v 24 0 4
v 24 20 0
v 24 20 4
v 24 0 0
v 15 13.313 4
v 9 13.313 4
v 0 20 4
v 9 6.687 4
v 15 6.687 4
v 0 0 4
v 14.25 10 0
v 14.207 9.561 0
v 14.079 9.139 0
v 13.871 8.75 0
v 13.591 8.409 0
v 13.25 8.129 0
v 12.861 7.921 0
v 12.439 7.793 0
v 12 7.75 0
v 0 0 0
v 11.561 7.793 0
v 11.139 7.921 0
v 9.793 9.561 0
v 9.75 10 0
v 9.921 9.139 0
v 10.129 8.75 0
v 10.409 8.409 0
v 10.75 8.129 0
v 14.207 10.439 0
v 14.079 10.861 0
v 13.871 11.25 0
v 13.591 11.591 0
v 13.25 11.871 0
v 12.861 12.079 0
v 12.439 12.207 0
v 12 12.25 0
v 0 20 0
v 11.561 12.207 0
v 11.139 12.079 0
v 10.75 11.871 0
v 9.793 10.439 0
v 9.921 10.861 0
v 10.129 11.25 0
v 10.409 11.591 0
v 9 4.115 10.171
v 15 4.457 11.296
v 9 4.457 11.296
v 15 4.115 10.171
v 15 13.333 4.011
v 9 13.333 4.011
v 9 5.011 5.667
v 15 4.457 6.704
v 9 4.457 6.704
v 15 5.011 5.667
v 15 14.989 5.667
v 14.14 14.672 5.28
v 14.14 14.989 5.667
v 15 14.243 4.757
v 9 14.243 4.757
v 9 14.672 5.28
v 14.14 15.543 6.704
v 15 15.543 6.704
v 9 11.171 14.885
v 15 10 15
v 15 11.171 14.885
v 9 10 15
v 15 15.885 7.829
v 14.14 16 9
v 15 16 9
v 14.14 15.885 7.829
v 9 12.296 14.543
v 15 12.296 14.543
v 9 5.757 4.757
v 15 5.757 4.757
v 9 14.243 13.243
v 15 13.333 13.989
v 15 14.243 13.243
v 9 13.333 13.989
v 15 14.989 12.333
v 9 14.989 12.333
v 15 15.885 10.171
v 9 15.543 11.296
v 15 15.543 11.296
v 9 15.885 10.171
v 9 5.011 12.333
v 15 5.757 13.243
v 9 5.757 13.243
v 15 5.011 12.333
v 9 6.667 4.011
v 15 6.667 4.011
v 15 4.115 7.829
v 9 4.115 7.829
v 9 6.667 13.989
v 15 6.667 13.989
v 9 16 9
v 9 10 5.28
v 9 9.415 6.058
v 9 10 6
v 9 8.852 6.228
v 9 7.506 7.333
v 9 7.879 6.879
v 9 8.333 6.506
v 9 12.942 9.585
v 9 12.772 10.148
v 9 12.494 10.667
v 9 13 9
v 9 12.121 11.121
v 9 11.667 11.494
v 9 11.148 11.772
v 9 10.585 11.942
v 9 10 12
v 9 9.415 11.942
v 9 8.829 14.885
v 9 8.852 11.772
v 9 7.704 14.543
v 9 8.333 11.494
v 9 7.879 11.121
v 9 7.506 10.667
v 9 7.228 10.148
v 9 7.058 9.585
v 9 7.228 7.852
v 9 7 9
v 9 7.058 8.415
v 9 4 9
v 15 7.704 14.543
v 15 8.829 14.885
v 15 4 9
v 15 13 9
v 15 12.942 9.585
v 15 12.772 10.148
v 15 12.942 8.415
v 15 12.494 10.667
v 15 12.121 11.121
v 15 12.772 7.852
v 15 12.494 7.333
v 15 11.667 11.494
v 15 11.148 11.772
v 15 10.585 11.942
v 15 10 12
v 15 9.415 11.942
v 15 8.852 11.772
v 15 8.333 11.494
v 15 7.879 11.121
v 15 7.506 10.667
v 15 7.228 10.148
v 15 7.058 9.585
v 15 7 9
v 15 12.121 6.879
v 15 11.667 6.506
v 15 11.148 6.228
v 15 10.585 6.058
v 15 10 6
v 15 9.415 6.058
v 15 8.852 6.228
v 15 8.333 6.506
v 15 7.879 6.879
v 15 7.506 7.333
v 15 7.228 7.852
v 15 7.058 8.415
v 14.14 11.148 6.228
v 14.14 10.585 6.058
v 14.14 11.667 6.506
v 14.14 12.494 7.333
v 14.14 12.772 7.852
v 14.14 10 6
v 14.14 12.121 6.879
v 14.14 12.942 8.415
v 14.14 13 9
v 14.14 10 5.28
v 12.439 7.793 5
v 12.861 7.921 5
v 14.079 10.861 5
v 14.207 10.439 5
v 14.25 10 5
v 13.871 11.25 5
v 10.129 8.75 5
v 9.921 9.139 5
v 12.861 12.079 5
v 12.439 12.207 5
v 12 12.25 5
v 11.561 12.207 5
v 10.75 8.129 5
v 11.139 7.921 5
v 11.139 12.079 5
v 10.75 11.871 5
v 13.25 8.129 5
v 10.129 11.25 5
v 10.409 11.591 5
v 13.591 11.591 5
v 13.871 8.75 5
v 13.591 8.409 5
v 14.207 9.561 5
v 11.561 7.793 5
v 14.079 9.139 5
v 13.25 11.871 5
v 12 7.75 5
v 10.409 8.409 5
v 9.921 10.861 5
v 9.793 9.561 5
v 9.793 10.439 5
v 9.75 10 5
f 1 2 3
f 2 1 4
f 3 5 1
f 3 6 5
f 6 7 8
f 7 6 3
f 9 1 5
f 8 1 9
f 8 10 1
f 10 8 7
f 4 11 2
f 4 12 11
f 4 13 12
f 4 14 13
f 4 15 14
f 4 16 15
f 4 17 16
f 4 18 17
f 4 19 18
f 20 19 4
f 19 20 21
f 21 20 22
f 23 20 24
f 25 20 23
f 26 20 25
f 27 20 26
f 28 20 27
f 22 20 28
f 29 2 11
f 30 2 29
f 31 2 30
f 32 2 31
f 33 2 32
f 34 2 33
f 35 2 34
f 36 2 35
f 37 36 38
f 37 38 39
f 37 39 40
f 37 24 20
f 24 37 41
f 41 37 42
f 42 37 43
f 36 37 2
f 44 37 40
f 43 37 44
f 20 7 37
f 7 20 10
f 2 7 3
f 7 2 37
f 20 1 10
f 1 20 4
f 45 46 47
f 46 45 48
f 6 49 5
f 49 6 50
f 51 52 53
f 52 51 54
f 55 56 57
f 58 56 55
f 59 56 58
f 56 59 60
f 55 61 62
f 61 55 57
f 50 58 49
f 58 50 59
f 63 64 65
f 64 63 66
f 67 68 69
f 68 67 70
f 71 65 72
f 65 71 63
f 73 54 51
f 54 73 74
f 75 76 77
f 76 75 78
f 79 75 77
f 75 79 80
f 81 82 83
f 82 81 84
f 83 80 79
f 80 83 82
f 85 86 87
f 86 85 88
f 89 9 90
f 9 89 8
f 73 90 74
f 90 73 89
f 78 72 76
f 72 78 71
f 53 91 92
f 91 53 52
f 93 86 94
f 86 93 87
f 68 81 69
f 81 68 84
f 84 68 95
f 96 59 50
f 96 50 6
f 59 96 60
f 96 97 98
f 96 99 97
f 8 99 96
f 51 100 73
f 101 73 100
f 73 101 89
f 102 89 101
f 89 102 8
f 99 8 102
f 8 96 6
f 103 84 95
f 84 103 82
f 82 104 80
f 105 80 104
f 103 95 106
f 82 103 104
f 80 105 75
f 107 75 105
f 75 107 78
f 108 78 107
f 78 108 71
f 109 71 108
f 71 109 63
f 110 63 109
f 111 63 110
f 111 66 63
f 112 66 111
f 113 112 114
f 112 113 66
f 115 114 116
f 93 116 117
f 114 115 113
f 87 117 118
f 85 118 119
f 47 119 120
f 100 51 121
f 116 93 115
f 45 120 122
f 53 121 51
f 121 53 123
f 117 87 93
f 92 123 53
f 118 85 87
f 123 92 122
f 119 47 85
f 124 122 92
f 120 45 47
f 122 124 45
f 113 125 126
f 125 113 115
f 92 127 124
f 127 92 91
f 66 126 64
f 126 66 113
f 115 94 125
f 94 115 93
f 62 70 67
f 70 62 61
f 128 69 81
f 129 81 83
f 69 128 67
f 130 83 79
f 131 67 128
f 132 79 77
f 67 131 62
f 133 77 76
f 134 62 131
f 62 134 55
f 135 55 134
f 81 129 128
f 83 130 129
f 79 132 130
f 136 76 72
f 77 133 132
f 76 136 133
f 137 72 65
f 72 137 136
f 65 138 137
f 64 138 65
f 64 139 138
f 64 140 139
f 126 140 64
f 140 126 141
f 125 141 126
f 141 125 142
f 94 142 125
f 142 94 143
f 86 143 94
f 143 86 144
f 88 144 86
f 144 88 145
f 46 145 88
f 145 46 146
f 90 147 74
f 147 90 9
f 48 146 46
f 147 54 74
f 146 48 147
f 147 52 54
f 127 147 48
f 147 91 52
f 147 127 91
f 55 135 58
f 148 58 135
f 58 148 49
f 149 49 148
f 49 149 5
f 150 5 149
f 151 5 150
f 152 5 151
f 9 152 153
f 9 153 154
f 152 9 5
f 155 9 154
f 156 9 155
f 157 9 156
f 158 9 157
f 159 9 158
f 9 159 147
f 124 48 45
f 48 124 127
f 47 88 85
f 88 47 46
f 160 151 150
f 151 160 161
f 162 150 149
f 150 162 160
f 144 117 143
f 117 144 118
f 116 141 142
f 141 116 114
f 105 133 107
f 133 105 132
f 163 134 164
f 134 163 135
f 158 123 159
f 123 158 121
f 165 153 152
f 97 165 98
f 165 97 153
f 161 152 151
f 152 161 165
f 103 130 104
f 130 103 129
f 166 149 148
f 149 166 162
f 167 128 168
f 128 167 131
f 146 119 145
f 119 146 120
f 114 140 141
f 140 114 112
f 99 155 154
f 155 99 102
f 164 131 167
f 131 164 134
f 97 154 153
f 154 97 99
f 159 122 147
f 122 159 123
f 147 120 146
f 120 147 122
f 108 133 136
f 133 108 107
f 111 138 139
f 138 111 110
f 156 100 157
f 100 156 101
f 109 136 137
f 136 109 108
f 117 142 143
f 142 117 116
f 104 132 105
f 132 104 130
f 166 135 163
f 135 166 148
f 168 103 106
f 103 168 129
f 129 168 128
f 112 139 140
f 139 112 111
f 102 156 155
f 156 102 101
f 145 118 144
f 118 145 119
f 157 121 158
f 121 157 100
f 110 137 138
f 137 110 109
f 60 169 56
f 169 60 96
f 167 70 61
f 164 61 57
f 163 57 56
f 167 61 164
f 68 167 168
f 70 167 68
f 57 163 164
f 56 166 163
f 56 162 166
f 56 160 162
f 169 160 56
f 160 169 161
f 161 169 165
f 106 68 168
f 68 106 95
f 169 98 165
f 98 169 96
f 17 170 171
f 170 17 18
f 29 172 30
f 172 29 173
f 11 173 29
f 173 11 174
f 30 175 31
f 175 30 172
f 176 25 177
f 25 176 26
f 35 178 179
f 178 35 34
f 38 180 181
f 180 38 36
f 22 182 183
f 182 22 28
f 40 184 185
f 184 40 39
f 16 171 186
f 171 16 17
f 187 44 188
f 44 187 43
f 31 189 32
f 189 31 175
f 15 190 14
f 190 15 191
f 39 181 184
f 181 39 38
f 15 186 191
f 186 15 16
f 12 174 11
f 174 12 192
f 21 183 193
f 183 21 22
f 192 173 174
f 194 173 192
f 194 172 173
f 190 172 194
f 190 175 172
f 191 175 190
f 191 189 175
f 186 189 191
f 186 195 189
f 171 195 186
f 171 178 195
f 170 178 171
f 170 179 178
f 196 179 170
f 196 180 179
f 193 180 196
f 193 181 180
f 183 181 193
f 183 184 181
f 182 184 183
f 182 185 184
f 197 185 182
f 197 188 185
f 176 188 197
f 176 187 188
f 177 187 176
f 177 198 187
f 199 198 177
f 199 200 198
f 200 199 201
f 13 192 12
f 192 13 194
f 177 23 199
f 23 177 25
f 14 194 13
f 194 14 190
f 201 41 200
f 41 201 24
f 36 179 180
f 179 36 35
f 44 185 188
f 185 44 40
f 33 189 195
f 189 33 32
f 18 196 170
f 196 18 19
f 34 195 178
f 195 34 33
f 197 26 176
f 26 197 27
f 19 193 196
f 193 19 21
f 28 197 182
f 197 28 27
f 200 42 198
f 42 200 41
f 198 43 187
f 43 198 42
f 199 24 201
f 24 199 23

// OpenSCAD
$fn = 32;

// ----------------------------------------------------------------------
// Cable clip: cable 6 mm, clamp 12 mm, base 24 mm
// ----------------------------------------------------------------------

// --- parameters (mm) ---
base_w = 24;              // base length, X
base_d = 20;              // base width, Y
base_t = 4;               // base thickness
clamp_d = 12;             // clamp outside diameter
wall_t = 3;               // clamp wall
cable_d = 6;              // cable opening
ring_w = 6;               // clamp width along the cable
screw_d = 4.5;            // screw clearance
throat = 3.72;            // snap throat width
sink = 1;                 // overlap of the clamp into the base

module base() {
  cube([base_w, base_d, base_t]);
}

module clamp() {
  translate([base_w / 2, base_d / 2, base_t + clamp_d / 2 - sink]) rotate([0, 90, 0])
    cylinder(h = ring_w, d = clamp_d, center = true);
}

difference() {
  union() {
    base();
    clamp();
  }
  translate([base_w / 2, base_d / 2, base_t + clamp_d / 2 - sink]) rotate([0, 90, 0]) translate([0, 0, -ring_w / 2 - 1]) cylinder(h = ring_w + 2, d = cable_d);
  /* snap throat: the opening is narrower than the cable */
  translate([base_w / 2 - throat / 2, base_d / 2, base_t + clamp_d / 2 - sink]) rotate([0, 90, 0]) translate([0, 0, -ring_w / 2 - 1]) cube([throat, clamp_d + 2, ring_w + 2]);
  translate([12, base_d / 2, -1]) cylinder(h = base_t + 2, d = screw_d);
}
